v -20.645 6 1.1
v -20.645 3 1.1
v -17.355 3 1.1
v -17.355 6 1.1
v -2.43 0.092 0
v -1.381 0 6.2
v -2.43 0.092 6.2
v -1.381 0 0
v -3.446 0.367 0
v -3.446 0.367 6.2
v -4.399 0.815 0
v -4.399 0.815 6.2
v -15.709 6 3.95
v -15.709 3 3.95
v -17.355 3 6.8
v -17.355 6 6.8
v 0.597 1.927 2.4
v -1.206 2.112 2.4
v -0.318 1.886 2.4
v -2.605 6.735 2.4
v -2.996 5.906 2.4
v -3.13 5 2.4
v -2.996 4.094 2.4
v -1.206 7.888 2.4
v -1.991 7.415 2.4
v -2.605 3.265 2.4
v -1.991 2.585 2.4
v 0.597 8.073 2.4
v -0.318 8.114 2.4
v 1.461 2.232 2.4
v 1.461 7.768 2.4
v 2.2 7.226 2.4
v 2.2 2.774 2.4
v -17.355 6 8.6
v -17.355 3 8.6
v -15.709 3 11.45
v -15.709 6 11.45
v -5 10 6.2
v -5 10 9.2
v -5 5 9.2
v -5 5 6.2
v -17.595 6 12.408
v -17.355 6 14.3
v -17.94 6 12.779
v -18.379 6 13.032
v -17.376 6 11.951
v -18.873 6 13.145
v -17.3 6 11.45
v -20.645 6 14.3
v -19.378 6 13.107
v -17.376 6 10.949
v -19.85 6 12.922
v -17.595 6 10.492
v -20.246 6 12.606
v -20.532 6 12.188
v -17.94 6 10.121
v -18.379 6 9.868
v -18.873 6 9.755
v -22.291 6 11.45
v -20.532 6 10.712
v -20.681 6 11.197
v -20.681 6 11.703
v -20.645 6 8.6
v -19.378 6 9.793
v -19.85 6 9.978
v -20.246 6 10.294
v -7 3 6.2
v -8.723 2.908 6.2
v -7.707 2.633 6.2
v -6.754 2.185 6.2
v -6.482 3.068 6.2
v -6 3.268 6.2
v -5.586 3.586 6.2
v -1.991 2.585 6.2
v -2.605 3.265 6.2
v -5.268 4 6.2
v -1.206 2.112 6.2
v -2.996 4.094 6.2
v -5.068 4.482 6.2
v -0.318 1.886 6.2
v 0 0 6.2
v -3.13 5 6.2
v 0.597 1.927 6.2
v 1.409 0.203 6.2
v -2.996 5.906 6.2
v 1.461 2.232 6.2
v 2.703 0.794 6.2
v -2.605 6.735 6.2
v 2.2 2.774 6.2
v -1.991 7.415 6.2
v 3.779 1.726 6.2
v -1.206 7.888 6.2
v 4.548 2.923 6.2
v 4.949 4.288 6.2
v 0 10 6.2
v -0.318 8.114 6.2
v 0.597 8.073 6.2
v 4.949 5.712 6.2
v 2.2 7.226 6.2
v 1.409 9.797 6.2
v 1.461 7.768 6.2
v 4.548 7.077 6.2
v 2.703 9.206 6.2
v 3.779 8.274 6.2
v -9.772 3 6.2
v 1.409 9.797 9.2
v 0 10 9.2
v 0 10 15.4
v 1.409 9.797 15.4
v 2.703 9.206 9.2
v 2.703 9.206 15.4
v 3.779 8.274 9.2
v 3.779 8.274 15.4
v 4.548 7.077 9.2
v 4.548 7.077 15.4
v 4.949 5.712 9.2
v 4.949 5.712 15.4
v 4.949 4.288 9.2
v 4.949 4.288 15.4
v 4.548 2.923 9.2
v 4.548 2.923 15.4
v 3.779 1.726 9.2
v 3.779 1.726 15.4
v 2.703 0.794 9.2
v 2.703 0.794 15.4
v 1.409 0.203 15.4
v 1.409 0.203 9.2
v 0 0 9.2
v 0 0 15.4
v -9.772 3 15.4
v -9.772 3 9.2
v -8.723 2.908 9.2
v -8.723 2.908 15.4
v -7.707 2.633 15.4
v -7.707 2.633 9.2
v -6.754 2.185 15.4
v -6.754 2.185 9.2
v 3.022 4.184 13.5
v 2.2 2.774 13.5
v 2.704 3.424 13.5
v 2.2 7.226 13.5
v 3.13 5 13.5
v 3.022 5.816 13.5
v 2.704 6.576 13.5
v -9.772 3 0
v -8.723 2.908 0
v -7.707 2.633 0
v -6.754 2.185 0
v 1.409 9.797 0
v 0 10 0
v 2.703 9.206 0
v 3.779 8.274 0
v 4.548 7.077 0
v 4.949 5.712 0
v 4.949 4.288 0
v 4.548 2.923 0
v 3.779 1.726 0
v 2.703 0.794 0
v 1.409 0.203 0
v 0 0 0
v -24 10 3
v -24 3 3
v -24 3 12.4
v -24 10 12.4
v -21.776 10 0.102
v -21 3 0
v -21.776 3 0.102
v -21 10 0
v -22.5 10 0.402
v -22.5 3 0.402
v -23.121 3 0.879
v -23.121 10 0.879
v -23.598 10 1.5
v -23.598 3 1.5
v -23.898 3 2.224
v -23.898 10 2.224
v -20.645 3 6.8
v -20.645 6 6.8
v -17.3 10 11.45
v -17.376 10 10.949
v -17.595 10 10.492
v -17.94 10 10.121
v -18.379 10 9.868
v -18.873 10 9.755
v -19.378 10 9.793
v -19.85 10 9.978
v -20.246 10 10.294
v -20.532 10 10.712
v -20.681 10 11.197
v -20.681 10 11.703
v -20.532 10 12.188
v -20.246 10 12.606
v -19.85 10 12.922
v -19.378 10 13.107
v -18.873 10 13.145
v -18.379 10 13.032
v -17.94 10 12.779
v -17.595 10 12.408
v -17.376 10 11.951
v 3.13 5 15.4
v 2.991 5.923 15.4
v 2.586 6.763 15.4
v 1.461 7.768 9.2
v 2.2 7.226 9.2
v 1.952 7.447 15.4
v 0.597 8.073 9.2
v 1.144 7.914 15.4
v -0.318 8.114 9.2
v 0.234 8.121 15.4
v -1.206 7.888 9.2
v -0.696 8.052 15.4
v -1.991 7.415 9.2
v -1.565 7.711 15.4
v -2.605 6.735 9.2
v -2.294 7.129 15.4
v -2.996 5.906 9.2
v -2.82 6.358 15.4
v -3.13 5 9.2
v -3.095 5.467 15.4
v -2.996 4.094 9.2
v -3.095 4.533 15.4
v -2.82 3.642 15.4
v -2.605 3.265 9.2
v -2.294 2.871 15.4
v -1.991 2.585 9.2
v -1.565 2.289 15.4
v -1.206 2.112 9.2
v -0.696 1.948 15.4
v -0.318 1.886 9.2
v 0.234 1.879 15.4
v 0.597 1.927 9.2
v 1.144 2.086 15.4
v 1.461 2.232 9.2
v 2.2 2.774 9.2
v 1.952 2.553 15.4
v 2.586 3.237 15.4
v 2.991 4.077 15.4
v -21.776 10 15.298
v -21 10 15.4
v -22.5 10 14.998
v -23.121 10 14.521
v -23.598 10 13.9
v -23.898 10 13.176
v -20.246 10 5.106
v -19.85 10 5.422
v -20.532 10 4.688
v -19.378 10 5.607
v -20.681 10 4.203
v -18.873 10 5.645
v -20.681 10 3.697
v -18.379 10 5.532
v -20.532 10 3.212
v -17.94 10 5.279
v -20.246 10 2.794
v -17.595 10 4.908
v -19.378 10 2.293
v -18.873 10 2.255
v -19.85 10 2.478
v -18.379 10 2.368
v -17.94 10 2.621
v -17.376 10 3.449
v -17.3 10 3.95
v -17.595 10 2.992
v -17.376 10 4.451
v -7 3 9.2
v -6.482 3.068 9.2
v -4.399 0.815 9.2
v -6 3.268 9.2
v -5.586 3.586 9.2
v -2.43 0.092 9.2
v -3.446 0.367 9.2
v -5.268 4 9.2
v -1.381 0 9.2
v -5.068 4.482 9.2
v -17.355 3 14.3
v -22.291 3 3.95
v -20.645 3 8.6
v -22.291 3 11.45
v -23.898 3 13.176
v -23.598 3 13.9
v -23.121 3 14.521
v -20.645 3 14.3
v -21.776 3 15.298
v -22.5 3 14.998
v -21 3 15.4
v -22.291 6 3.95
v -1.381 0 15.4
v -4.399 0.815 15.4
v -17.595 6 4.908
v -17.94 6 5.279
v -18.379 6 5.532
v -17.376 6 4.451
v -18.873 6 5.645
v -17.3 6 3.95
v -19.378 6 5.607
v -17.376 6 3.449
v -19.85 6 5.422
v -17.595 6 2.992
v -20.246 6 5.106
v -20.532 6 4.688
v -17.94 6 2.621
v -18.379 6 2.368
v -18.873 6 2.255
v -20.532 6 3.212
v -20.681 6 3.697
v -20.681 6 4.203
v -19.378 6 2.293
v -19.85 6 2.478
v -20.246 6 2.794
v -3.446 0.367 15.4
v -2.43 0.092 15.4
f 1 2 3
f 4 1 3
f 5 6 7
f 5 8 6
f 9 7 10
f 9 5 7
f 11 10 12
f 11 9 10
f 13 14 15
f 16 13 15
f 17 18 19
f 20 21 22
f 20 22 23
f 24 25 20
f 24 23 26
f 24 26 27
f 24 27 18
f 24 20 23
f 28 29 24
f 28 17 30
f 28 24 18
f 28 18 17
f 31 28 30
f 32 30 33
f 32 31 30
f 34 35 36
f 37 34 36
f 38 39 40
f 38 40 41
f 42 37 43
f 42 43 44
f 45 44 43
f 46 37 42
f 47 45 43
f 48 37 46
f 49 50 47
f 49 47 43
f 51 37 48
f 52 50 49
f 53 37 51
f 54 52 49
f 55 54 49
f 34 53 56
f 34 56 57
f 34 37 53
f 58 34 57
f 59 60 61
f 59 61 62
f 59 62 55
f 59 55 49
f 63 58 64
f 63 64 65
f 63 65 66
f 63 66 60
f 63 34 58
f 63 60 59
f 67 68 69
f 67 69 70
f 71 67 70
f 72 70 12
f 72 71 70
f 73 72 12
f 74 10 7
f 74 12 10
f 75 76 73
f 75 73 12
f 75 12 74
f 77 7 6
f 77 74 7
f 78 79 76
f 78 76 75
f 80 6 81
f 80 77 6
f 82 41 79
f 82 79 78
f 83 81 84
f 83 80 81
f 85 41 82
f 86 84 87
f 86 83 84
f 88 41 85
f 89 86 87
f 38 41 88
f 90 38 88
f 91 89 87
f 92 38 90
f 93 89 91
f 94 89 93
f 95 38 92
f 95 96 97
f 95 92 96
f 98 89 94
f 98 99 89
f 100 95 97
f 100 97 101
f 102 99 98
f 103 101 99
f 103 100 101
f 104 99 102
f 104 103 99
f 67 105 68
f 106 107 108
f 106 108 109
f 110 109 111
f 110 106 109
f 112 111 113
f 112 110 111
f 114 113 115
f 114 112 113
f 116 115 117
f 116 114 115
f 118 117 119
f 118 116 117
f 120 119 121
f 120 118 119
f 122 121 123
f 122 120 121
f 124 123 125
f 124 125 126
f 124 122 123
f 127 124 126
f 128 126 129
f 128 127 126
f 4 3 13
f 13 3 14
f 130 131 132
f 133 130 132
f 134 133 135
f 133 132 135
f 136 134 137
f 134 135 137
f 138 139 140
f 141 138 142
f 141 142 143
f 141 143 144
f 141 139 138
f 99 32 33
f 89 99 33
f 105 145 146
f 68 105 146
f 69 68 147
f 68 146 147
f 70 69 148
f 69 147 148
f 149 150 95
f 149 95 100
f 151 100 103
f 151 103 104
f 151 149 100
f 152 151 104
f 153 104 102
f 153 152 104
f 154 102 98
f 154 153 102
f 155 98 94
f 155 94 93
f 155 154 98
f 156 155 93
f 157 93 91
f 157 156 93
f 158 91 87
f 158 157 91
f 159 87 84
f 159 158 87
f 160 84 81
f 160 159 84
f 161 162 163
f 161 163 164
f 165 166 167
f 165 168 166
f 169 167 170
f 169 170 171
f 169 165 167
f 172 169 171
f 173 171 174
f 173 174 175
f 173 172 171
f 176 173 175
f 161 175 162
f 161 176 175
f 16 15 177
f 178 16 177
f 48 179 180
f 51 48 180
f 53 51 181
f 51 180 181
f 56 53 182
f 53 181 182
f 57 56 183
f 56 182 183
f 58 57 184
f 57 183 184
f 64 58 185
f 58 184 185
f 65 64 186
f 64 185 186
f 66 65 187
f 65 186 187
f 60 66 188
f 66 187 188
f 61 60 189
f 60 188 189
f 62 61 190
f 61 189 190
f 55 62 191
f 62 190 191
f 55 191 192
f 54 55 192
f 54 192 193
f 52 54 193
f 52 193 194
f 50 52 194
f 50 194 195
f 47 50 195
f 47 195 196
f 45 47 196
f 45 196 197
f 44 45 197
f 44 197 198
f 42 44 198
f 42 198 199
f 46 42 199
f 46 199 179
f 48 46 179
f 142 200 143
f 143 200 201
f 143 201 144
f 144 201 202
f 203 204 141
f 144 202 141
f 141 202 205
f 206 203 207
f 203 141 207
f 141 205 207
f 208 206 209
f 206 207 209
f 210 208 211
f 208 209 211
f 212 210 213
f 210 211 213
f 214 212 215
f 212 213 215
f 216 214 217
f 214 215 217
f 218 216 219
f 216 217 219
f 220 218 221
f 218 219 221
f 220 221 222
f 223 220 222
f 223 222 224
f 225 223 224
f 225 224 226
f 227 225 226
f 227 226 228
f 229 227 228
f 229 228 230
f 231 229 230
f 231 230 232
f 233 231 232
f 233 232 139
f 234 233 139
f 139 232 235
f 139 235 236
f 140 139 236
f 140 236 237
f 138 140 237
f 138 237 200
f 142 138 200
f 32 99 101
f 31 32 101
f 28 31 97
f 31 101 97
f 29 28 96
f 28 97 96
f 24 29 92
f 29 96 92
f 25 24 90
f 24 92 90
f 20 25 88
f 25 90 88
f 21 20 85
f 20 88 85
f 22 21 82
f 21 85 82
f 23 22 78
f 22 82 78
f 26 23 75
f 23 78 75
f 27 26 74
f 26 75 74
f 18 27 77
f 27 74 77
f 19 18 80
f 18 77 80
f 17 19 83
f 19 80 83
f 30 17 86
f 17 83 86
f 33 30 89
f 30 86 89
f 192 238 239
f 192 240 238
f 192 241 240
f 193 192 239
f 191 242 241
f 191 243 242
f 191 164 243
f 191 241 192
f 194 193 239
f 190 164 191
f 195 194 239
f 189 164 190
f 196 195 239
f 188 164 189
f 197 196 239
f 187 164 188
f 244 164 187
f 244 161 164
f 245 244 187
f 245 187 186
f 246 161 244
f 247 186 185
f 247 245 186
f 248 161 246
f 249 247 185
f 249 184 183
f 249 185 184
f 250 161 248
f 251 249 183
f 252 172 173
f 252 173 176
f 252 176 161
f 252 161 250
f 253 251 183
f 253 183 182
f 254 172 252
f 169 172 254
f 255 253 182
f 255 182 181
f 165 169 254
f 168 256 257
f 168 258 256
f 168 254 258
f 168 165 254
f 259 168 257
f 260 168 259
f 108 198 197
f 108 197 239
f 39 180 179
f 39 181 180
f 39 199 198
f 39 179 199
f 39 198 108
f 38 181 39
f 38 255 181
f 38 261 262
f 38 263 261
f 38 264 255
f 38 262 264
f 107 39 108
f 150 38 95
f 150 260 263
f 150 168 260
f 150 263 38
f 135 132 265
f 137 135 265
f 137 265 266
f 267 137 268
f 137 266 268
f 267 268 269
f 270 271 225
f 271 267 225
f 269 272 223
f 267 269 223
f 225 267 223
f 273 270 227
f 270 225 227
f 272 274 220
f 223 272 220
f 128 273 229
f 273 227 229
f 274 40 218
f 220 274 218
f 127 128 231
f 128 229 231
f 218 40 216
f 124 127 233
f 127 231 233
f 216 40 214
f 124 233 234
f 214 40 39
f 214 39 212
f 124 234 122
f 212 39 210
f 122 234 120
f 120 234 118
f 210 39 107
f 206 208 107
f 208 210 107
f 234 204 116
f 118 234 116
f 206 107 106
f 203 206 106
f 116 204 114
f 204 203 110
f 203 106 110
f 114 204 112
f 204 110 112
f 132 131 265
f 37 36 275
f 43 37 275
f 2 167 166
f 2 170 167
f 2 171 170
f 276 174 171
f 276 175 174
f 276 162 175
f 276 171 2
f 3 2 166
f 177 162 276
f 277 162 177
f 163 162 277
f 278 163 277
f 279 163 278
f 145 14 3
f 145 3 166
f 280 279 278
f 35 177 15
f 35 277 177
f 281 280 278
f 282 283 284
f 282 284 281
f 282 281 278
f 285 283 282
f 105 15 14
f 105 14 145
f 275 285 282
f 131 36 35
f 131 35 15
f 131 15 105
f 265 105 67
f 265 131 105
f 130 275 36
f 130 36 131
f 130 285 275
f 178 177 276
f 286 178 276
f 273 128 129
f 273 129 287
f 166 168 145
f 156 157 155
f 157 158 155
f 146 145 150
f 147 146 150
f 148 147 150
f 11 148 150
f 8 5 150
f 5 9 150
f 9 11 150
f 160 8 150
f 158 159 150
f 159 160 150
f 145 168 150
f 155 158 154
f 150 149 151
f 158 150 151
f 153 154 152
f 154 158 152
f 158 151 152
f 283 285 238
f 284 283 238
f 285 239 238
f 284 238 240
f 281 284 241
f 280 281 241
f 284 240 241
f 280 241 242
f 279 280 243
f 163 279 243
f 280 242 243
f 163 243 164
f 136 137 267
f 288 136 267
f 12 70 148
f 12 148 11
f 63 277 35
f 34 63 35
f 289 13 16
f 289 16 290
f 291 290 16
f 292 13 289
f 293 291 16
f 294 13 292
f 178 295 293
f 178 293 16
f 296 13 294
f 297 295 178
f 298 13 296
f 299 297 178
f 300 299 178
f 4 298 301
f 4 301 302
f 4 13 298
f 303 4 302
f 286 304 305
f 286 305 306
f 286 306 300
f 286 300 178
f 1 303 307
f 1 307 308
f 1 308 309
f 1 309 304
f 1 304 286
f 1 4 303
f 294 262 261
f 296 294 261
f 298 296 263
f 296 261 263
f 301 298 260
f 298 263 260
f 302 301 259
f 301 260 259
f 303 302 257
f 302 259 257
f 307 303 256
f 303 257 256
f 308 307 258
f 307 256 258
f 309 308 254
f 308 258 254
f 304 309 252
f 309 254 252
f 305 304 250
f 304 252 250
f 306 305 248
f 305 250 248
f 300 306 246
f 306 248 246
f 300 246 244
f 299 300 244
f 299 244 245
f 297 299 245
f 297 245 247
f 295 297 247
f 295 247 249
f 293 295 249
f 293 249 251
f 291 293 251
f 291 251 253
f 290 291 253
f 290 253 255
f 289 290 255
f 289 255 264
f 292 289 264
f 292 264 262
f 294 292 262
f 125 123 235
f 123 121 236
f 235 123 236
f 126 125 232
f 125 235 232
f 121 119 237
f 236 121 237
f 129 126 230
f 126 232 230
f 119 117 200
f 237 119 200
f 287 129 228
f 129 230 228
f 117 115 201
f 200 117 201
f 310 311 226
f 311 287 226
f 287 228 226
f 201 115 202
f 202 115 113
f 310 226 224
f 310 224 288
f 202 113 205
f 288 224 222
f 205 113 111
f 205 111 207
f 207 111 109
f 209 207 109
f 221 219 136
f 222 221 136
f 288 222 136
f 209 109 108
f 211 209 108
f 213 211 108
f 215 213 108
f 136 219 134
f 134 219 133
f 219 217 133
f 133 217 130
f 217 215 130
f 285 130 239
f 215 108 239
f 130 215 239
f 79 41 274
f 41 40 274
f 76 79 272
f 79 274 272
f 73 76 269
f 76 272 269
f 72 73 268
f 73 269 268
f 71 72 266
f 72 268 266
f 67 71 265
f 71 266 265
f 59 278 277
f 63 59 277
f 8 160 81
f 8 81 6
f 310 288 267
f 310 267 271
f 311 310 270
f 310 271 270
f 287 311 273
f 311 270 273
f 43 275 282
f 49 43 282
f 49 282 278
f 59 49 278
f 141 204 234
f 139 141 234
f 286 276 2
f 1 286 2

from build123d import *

# Parameters (mm, degrees)
DODANIE_WYCI_GNI_CIE1_DEPTH      = 15.4
SZKIC2_R                         = 3.13
WYTNIJ_WYCI_GNI_CIE1_DEPTH       = 13
WYTNIJ_WYCI_GNI_CIE13_DEPTH      = 7.62
WYTNIJ_WYCI_GNI_CIE13_DEPTH_BACK = 9.78
DODANIE_WYCI_GNI_CIE2_START      = -17.88
DODANIE_WYCI_GNI_CIE2_DEPTH      = 13.5
SZKIC18_W                        = 10
SZKIC18_H                        = 3
WYTNIJ_WYCI_GNI_CIE14_DEPTH      = 11
ZAOKR_GLENIE2_R                  = 3
ZAOKR_GLENIE3_R                  = 6
WYTNIJ_WYCI_GNI_CIE15_DEPTH      = 3
ZAOKR_GLENIE5_R                  = 2
SZKIC20_R                        = 1.7
WYTNIJ_WYCI_GNI_CIE16_DEPTH      = 11
WYTNIJ_WYCI_GNI_CIE17_DEPTH      = 3


with BuildPart() as part:
    # Szkic1 → Dodanie-wyciągnięcie1 (new body)
    with BuildSketch(Plane.XY):
        with BuildLine():
            Line((0, 0), (-24, 0))
            Line((-24, 0), (-24, 10))
            Line((-24, 10), (0, 10))
            ThreePointArc((0, 10), (5, 5), (0, 0))
        make_face()
    extrude(amount=DODANIE_WYCI_GNI_CIE1_DEPTH)

    # Szkic2 → Wytnij-wyciągnięcie1 (cut)
    with BuildSketch(Plane.XY.offset(15.4)):
        with Locations((0, 5)):
            Circle(SZKIC2_R)
    extrude(amount=-WYTNIJ_WYCI_GNI_CIE1_DEPTH, mode=Mode.SUBTRACT)

    # Szkic16 → Wytnij-wyciągnięcie13 (cut, two sides)
    with BuildSketch(Plane(origin=(0, 0, 6.62), x_dir=(-1, 0, 0), z_dir=(0, 0, -1))) as wytnij_wyci_gni_cie13_sk:
        Polygon((31, 0), (31, 3), (8.153065534, 3), (3, 0), align=None)
    extrude(amount=WYTNIJ_WYCI_GNI_CIE13_DEPTH, mode=Mode.SUBTRACT)
    extrude(wytnij_wyci_gni_cie13_sk.sketch, amount=-WYTNIJ_WYCI_GNI_CIE13_DEPTH_BACK, mode=Mode.SUBTRACT)

    # Szkic10 → Dodanie-wyciągnięcie2 (add)
    with BuildSketch(Plane.XY.offset(17.88).offset(DODANIE_WYCI_GNI_CIE2_START)):
        with BuildLine():
            Line((2.2, 7.226409666), (2.2, 2.773590334))
            ThreePointArc((2.2, 2.773590334), (3.13, 5), (2.2, 7.226409666))
        make_face()
    extrude(amount=DODANIE_WYCI_GNI_CIE2_DEPTH)

    # Szkic18 → Wytnij-wyciągnięcie14 (cut, through all)
    with BuildSketch(Plane(origin=(0, 10, 0), x_dir=(1, 0, 0), z_dir=(0, 1, 0))):
        with Locations((0, -7.7)):
            Rectangle(SZKIC18_W, SZKIC18_H)
    extrude(amount=-WYTNIJ_WYCI_GNI_CIE14_DEPTH, mode=Mode.SUBTRACT)

    # Zaokrąglenie2
    zaokr_glenie2_edges = [part.edges().sort_by_distance(p)[0] for p in [
        (-24, 6.5, 0),
        (-24, 6.5, 15.4),
    ]]
    fillet(zaokr_glenie2_edges, radius=ZAOKR_GLENIE2_R)

    # Zaokrąglenie3
    zaokr_glenie3_edges = [part.edges().sort_by_distance(p)[0] for p in [
        (-3, 0, 12.3),
        (-8.153065534, 3, 7.7),
        (-3, 0, 3.1),
    ]]
    fillet(zaokr_glenie3_edges, radius=ZAOKR_GLENIE3_R)

    # Szkic19 → Wytnij-wyciągnięcie15 (cut)
    with BuildSketch(Plane(origin=(0, 0, 9.2), x_dir=(-1, 0, 0), z_dir=(0, 0, -1))):
        Polygon((3.986195456, 3), (13.986195456, 3), (0.751466107, -7.194094716), align=None)
    extrude(amount=WYTNIJ_WYCI_GNI_CIE15_DEPTH, mode=Mode.SUBTRACT)

    # Zaokrąglenie5
    zaokr_glenie5_edges = [part.edges().sort_by_distance(p)[0] for p in [
        (-5, 3, 7.7),
    ]]
    fillet(zaokr_glenie5_edges, radius=ZAOKR_GLENIE5_R)

    # Szkic20 → Wytnij-wyciągnięcie16 (cut, through all)
    with BuildSketch(Plane(origin=(0, 10, 0), x_dir=(1, 0, 0), z_dir=(0, 1, 0))):
        with Locations((-19, -3.95)):
            Circle(SZKIC20_R)
        with Locations((-19, -11.45)):
            Circle(SZKIC20_R)
    extrude(amount=-WYTNIJ_WYCI_GNI_CIE16_DEPTH, mode=Mode.SUBTRACT)

    # Szkic21 → Wytnij-wyciągnięcie17 (cut)
    with BuildSketch(Plane(origin=(0, 3, 0), x_dir=(-1, 0, 0), z_dir=(0, -1, 0))):
        Polygon((15.709103466, -3.95), (17.354551733, -6.8), (20.645448267, -6.8), (22.290896534, -3.95), (20.645448267, -1.1), (17.354551733, -1.1), align=None)
        Polygon((15.709103466, -11.45), (17.354551733, -14.3), (20.645448267, -14.3), (22.290896534, -11.45), (20.645448267, -8.6), (17.354551733, -8.6), align=None)
    extrude(amount=-WYTNIJ_WYCI_GNI_CIE17_DEPTH, mode=Mode.SUBTRACT)


solid = part.part
